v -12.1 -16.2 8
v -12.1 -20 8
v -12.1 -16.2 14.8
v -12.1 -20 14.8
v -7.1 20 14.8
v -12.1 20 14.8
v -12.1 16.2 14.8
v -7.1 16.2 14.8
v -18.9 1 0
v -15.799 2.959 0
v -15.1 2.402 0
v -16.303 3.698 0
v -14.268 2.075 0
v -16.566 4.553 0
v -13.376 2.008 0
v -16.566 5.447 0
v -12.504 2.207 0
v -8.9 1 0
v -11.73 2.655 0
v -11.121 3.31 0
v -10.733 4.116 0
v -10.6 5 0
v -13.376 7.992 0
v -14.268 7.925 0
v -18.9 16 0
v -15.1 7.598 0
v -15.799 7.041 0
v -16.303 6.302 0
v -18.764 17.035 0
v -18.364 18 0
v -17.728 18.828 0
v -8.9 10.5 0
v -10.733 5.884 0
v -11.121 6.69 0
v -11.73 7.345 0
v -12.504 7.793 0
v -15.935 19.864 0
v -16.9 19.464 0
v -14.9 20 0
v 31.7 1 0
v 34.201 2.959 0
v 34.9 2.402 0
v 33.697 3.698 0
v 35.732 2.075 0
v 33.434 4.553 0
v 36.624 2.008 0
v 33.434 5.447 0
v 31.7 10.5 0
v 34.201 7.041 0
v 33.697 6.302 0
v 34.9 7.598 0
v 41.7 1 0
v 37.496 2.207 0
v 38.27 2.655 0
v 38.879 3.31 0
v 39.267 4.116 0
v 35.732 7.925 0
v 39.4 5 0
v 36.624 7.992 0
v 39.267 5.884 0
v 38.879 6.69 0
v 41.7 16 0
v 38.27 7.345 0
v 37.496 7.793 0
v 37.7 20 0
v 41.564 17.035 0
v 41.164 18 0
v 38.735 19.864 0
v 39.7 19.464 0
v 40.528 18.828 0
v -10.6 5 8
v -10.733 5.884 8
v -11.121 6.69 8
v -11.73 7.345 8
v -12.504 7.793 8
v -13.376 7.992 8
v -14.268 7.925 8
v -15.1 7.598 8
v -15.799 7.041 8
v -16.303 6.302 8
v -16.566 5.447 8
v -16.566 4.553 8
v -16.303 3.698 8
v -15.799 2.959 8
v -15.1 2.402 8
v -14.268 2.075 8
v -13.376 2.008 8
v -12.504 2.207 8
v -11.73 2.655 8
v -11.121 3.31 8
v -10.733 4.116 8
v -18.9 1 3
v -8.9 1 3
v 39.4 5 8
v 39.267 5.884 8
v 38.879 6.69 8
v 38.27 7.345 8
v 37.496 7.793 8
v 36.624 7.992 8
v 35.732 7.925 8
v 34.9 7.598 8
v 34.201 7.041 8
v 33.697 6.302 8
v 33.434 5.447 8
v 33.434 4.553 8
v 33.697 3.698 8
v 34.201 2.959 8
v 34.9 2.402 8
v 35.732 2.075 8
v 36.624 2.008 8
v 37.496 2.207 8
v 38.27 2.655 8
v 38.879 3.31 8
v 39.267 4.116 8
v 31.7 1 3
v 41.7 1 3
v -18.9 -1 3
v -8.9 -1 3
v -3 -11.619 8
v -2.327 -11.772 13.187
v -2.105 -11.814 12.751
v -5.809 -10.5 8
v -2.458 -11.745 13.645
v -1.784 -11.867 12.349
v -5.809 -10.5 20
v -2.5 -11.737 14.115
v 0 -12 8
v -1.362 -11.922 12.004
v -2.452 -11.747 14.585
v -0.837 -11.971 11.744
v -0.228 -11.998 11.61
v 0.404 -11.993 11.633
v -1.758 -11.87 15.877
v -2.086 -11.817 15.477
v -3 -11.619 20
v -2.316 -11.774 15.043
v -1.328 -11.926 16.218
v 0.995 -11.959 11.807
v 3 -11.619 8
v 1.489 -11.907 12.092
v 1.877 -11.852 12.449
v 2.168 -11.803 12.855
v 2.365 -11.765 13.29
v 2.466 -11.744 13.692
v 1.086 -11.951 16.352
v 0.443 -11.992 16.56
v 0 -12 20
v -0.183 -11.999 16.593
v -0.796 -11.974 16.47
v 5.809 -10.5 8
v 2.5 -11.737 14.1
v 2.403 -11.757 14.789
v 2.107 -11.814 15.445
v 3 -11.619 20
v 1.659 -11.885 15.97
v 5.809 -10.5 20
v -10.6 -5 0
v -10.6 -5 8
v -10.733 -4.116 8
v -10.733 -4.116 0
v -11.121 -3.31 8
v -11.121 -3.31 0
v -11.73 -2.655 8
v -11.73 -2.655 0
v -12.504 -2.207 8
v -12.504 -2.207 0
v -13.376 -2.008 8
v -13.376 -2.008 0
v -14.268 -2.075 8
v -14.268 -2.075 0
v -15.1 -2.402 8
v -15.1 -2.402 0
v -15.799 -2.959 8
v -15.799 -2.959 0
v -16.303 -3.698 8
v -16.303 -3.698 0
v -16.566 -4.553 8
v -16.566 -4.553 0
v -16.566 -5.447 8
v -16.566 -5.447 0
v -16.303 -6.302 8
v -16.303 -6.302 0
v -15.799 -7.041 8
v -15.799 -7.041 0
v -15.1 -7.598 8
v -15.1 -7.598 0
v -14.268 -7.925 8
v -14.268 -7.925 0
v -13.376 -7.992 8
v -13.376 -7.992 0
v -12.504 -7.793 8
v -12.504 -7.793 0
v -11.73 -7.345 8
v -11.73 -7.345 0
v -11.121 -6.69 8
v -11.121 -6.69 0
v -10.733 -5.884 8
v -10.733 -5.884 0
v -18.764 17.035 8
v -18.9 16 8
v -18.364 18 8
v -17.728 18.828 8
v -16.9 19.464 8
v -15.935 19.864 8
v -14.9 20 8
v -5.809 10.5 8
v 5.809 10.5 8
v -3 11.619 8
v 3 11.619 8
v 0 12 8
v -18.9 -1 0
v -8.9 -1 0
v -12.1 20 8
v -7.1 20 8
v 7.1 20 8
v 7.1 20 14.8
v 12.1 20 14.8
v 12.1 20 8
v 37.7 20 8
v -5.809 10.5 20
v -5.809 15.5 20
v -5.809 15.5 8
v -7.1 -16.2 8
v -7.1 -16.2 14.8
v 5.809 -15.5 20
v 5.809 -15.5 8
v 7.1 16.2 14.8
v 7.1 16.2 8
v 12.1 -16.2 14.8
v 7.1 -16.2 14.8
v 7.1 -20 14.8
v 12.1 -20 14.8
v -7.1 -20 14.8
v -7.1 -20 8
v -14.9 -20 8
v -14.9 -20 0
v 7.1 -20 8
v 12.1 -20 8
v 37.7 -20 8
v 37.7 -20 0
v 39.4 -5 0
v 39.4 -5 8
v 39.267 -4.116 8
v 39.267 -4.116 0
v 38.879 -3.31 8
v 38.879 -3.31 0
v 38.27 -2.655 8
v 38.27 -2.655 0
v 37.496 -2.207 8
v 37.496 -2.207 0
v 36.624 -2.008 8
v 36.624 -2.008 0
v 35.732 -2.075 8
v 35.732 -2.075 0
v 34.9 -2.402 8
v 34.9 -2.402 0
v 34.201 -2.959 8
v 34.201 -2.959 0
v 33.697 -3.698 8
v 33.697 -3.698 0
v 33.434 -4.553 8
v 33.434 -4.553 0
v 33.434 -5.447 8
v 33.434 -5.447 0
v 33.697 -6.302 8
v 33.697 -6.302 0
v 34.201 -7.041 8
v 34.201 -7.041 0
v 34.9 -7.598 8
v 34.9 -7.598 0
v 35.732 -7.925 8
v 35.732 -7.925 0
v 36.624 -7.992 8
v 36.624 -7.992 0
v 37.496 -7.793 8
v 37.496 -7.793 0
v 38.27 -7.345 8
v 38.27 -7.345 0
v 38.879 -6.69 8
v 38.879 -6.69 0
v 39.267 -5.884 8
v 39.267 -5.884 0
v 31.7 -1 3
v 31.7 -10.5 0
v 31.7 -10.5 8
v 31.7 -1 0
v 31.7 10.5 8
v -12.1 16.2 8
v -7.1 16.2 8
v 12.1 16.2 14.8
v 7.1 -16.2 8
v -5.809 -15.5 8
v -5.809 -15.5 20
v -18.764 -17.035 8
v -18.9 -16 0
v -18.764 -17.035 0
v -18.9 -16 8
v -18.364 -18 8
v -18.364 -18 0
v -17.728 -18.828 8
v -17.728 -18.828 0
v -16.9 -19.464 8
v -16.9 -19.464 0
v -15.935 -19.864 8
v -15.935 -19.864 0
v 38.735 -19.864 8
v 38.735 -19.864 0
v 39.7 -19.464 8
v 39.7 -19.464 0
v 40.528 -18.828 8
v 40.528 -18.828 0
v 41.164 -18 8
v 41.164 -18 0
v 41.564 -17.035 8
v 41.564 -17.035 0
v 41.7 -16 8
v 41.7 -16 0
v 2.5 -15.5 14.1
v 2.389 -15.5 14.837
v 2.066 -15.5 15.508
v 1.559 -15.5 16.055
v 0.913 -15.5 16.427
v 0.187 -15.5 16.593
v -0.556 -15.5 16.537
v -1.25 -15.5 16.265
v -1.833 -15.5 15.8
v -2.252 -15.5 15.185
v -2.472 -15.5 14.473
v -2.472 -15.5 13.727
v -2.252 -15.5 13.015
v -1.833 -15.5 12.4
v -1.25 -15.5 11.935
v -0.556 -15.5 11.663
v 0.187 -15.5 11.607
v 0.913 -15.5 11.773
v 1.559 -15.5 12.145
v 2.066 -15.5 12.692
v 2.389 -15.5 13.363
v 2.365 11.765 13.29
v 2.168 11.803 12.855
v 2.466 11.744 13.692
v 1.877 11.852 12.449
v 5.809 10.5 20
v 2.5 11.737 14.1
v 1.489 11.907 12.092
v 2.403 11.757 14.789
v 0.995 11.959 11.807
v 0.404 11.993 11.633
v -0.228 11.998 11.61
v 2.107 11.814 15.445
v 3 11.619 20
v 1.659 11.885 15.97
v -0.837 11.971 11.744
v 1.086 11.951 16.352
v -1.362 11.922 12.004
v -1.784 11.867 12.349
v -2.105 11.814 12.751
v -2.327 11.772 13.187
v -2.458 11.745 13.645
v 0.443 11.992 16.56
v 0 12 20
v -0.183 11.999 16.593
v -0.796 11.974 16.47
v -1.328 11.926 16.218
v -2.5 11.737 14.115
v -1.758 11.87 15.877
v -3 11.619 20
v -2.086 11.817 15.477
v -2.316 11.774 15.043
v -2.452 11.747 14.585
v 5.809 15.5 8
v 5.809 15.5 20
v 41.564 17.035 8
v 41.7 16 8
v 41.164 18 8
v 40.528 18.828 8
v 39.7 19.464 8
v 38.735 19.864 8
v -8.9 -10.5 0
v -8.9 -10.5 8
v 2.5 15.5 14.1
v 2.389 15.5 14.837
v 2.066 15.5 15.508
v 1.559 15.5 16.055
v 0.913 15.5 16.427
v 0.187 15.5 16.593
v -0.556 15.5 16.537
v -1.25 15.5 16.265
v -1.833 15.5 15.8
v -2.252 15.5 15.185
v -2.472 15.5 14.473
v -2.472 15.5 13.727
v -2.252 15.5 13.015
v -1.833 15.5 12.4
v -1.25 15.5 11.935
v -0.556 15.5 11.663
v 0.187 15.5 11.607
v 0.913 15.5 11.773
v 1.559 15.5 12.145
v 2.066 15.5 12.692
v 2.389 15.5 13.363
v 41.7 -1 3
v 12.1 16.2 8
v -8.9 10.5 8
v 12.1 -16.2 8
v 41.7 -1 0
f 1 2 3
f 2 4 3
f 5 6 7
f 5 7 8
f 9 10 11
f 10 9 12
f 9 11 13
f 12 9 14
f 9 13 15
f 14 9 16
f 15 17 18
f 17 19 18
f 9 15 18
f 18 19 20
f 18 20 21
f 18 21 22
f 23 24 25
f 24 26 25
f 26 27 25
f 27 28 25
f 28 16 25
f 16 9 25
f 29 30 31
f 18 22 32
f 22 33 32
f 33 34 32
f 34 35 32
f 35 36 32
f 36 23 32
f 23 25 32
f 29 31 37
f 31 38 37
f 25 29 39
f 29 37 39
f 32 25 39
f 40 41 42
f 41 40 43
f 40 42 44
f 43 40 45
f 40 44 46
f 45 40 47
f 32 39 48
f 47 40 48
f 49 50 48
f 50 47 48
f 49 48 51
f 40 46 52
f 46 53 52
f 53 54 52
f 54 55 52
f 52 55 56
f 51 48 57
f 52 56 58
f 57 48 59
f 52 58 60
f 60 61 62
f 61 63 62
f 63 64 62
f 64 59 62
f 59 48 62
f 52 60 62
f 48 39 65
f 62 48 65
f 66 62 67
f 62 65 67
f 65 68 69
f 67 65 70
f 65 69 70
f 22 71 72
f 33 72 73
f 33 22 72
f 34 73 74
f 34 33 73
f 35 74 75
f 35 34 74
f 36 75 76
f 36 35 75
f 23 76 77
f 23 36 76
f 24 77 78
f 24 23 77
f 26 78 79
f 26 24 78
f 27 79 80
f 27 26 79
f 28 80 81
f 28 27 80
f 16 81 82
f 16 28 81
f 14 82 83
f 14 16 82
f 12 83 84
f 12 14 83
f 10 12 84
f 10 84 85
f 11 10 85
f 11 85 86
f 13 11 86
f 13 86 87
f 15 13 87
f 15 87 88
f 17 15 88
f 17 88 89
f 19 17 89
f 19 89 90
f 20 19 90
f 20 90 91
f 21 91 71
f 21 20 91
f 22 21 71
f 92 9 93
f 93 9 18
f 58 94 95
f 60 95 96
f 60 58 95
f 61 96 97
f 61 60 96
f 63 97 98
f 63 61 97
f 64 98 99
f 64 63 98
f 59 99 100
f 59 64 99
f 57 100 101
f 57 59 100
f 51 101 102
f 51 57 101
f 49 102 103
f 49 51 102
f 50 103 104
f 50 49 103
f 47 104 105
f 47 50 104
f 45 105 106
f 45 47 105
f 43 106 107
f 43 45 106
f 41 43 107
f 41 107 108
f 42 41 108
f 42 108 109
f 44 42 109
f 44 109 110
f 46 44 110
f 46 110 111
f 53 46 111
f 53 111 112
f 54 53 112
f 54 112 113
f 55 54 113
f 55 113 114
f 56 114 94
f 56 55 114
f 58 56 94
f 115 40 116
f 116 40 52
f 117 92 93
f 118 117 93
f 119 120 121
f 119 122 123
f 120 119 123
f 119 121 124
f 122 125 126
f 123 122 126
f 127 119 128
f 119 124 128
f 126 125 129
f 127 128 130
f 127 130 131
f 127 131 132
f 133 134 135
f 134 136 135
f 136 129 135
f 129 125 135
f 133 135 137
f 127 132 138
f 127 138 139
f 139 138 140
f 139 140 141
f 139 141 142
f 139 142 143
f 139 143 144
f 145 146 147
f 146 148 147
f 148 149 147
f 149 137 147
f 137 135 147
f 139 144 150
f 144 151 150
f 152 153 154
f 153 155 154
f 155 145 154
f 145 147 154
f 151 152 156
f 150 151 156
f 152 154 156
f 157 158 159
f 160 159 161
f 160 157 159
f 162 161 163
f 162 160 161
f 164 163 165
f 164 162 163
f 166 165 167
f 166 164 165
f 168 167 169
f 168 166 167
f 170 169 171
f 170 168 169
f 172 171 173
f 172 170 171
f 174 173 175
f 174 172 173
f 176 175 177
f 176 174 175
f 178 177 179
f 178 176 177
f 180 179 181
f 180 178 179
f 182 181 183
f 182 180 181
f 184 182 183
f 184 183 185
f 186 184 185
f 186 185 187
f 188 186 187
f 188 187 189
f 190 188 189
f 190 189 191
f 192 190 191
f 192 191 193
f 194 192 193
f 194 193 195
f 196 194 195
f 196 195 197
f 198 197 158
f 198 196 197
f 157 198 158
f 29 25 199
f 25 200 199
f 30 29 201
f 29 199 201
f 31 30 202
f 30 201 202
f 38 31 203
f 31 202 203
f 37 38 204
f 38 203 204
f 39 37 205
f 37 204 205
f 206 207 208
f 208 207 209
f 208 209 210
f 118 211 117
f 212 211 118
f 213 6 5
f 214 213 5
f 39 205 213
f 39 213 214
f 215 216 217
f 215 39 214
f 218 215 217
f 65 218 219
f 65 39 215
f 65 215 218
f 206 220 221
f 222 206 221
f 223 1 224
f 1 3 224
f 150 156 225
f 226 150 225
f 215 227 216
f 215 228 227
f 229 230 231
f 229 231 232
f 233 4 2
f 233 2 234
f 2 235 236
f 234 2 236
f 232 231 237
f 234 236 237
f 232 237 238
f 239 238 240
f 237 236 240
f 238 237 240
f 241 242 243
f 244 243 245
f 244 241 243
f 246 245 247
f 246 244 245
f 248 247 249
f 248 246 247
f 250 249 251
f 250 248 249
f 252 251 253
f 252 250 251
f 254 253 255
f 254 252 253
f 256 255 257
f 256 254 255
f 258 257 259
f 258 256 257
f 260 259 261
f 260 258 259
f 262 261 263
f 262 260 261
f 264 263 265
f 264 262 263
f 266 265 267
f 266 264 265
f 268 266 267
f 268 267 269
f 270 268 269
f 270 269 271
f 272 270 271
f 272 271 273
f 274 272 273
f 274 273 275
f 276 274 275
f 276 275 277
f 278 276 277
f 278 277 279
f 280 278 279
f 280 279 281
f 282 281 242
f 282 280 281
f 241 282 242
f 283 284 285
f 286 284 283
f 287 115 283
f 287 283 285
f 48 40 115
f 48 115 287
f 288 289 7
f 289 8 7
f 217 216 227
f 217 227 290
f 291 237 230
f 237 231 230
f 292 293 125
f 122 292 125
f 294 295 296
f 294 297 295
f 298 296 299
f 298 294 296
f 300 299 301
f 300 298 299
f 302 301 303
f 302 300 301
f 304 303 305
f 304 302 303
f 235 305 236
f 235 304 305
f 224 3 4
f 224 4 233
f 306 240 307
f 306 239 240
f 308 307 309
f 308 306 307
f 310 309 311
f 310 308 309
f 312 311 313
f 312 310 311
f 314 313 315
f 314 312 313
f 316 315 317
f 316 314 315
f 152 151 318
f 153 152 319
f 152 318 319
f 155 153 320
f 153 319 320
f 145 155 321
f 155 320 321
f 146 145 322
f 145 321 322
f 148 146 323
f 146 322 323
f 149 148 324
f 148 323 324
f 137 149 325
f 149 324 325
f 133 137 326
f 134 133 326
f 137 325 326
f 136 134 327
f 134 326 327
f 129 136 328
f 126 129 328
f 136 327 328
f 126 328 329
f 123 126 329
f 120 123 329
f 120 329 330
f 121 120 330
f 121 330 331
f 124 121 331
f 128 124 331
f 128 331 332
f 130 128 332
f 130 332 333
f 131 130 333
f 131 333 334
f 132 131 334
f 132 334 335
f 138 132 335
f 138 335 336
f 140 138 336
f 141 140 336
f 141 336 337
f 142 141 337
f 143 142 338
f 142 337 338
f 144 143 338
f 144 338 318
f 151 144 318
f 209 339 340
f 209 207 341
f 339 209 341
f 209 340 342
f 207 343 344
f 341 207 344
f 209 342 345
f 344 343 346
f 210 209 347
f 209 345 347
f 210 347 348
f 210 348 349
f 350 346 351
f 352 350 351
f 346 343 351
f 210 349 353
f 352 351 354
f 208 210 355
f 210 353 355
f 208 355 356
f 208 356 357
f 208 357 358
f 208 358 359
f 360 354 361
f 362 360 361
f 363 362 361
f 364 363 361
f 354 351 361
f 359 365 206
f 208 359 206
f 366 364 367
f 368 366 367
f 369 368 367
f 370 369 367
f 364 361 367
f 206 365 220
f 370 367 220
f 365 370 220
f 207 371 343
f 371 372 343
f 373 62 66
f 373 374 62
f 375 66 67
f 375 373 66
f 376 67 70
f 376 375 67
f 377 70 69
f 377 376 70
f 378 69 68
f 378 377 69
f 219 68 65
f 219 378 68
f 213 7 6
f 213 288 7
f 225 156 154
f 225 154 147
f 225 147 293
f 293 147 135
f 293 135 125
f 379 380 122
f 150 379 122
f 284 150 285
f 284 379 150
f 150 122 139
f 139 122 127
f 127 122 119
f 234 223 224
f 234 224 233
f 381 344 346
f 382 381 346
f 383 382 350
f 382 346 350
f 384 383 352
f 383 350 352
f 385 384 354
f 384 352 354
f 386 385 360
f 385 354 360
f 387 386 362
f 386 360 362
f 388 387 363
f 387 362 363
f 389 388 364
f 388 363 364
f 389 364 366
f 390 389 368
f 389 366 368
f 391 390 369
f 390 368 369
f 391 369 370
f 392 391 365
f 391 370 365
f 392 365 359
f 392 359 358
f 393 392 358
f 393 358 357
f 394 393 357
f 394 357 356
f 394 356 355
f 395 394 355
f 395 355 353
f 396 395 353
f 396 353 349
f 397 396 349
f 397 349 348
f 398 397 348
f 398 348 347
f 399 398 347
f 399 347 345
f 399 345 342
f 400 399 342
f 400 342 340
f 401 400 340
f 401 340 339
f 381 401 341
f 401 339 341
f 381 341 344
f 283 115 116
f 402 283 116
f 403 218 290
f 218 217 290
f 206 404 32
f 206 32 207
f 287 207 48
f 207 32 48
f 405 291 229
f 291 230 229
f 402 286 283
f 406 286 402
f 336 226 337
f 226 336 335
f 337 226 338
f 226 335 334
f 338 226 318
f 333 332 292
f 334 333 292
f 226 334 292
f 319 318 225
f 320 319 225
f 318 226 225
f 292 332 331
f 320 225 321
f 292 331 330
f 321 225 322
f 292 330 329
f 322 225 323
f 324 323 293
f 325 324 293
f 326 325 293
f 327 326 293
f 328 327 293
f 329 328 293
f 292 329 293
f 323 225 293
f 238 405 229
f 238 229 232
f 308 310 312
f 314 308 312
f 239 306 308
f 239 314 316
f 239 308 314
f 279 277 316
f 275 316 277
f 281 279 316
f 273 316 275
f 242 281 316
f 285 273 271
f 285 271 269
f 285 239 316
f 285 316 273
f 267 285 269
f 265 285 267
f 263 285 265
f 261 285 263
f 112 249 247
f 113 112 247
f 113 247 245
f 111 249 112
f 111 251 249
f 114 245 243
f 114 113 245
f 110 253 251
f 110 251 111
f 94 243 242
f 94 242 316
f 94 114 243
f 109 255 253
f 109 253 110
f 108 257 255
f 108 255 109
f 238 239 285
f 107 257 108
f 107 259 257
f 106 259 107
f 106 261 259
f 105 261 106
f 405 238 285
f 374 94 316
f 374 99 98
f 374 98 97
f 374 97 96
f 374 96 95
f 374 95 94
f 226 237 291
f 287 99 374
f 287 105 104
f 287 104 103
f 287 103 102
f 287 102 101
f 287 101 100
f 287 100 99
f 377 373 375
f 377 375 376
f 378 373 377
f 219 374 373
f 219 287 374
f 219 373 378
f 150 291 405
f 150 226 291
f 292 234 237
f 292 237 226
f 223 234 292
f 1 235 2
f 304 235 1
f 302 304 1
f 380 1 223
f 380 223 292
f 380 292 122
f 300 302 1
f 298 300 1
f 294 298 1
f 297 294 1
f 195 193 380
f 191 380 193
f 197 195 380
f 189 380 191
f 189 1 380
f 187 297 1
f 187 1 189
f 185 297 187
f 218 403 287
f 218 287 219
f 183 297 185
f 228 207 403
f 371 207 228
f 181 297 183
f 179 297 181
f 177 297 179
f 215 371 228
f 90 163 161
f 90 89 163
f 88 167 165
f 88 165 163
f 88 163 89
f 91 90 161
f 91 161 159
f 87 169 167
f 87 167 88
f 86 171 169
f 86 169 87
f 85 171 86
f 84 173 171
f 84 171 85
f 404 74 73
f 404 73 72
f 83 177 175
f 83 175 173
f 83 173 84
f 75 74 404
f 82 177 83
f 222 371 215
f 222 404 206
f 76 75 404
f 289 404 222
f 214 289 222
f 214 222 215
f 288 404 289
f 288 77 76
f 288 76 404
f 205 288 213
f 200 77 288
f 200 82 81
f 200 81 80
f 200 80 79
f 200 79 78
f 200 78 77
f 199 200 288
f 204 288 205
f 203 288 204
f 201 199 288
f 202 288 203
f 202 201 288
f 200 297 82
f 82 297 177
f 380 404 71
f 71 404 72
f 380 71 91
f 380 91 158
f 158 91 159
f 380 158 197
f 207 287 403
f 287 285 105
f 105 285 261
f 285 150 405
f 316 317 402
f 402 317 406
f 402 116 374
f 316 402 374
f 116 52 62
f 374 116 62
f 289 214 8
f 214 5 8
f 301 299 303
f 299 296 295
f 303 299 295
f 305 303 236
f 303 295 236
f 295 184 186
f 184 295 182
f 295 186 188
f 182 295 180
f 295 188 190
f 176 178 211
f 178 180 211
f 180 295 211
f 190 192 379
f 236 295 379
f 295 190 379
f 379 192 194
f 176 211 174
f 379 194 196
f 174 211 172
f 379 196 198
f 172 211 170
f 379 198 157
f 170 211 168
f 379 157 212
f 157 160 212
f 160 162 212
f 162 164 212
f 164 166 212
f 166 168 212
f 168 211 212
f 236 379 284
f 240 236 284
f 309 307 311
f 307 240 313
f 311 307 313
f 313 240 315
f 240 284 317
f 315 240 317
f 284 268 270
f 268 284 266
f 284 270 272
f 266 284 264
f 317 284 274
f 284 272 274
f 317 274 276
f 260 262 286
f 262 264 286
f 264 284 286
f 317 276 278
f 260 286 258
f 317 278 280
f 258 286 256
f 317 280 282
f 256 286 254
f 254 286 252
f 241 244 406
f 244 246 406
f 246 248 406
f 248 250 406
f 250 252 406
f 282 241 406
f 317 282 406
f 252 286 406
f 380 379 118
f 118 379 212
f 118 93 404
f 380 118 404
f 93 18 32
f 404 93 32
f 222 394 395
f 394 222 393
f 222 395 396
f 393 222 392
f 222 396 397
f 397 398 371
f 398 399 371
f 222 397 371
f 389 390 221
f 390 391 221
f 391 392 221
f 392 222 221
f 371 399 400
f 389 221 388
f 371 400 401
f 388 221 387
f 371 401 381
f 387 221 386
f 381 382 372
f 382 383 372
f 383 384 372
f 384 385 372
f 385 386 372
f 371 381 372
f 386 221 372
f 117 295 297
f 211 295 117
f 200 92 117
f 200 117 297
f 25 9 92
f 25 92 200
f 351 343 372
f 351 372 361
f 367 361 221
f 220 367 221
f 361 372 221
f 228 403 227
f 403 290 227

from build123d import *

# Parameters (mm, degrees)
SKETCH_W        = 60.6
SKETCH_H        = 40
SKETCH_R        = 3
SKETCH_W_2      = 40.6
SKETCH_H_2      = 21
PAD_DEPTH       = 10
SKETCH001_W     = 60.6
SKETCH001_H     = 2
POCKET_DEPTH    = 3
PAD001_DEPTH    = 10
SKETCH003_R     = 2.5
POCKET001_DEPTH = 35.501
SKETCH004_W     = 5
SKETCH004_H     = 3.8
PAD002_DEPTH    = 4.8
PAD002_FACE4_R  = 3
POCKET002_DEPTH = 2
POCKET003_DEPTH = 2
POCKET004_DEPTH = 2
FILLET_R        = 4


with BuildPart() as part:
    # Sketch → Pad (new body)
    with BuildSketch(Plane.XY):
        with Locations((11.4, 0)):
            Rectangle(SKETCH_W, SKETCH_H)
        with Locations((-13.6, 5)):
            Circle(SKETCH_R, mode=Mode.SUBTRACT)
        with Locations((-13.6, -5)):
            Circle(SKETCH_R, mode=Mode.SUBTRACT)
        with Locations((36.4, 5)):
            Circle(SKETCH_R, mode=Mode.SUBTRACT)
        with Locations((36.4, -5)):
            Circle(SKETCH_R, mode=Mode.SUBTRACT)
        with Locations((11.4, 0)):
            Rectangle(SKETCH_W_2, SKETCH_H_2, mode=Mode.SUBTRACT)
    extrude(amount=PAD_DEPTH)

    # Sketch001 (on DatumPlane) → Pocket (cut)
    with BuildSketch(Plane.XY):
        with Locations((11.4, 0)):
            Rectangle(SKETCH001_W, SKETCH001_H)
    extrude(amount=POCKET_DEPTH, mode=Mode.SUBTRACT)

    # Sketch002 (on Face5 of Pocket) → Pad001 (join)
    with BuildSketch(Plane.XY.offset(10)):
        with BuildLine():
            Line((-5.809475, 15.5), (5.809475, 15.5))
            Line((5.809475, 15.5), (5.809475, 10.5))
            ThreePointArc((5.809475, 10.5), (0, 12), (-5.809475, 10.5))
            Line((-5.809475, 10.5), (-5.809475, 15.5))
        make_face()
        with BuildLine():
            Line((5.809475, -10.5), (5.809475, -15.5))
            Line((5.809475, -15.5), (-5.809475, -15.5))
            Line((-5.809475, -15.5), (-5.809475, -10.5))
            ThreePointArc((-5.809475, -10.5), (0, -12), (5.809475, -10.5))
        make_face()
    extrude(amount=PAD001_DEPTH)

    # Sketch003 (on Face23 of Pad001) → Pocket001 (cut, through all)
    with BuildSketch(Plane.XZ.offset(15.5)):
        with Locations((0, 14.1)):
            Circle(SKETCH003_R)
    extrude(amount=-POCKET001_DEPTH, mode=Mode.SUBTRACT)

    # Sketch004 (on Face5 of Pocket001) → Pad002 (join)
    with BuildSketch(Plane.XY.offset(10)):
        with Locations((9.6, 18.1)):
            Rectangle(SKETCH004_W, SKETCH004_H)
        with Locations((-9.6, 18.1)):
            Rectangle(SKETCH004_W, SKETCH004_H)
        with Locations((-9.6, -18.1)):
            Rectangle(SKETCH004_W, SKETCH004_H)
        with Locations((9.6, -18.1)):
            Rectangle(SKETCH004_W, SKETCH004_H)
    extrude(amount=PAD002_DEPTH)

    # Pad002 Face4 → Pocket002 (cut)
    with BuildSketch(Plane(origin=(13.130462, 0, 10), x_dir=(0, 1, 0), z_dir=(0, 0, 1))):
        Polygon((20, 25.230462), (20, 32.030462), (-20, 32.030462), (-20, 25.230462), (-16.2, 25.230462), (-16.2, 20.230462), (-20, 20.230462), (-20, 6.030462), (-16.2, 6.030462), (-16.2, 1.030462), (-20, 1.030462), (-20, -28.569538), (20, -28.569538), (20, 1.030462), (16.2, 1.030462), (16.2, 6.030462), (20, 6.030462), (20, 20.230462), (16.2, 20.230462), (16.2, 25.230462), align=None)
        with Locations((-5, 26.730462)):
            Circle(PAD002_FACE4_R, mode=Mode.SUBTRACT)
        with Locations((-5, -23.269538)):
            Circle(PAD002_FACE4_R, mode=Mode.SUBTRACT)
        with Locations((5, 26.730462)):
            Circle(PAD002_FACE4_R, mode=Mode.SUBTRACT)
        Polygon((-10.5, 22.030462), (10.5, 22.030462), (10.5, 18.939937), (15.5, 18.939937), (15.5, 7.320987), (10.5, 7.320987), (10.5, -18.569538), (-10.5, -18.569538), (-10.5, 7.320987), (-15.5, 7.320987), (-15.5, 18.939937), (-10.5, 18.939937), align=None, mode=Mode.SUBTRACT)
        with Locations((5, -23.269538)):
            Circle(PAD002_FACE4_R, mode=Mode.SUBTRACT)
    extrude(amount=-POCKET002_DEPTH, mode=Mode.SUBTRACT)

    # Pocket002 Face25 → Pocket003 (cut)
    with BuildSketch(Plane(origin=(0, 11.103335, 10), x_dir=(0, 1, 0), z_dir=(0, 0, 1))):
        with BuildLine():
            ThreePointArc((-0.603335, -5.809475), (0.896665, 0), (-0.603335, 5.809475))
            Line((-0.603335, 5.809475), (-0.603335, -5.809475))
        make_face()
    extrude(amount=-POCKET003_DEPTH, mode=Mode.SUBTRACT)

    # Pocket003 Face45 → Pocket004 (cut)
    with BuildSketch(Plane(origin=(0, -11.103335, 10), x_dir=(0, 1, 0), z_dir=(0, 0, 1))):
        with BuildLine():
            Line((0.603335, -5.809475), (0.603335, 5.809475))
            ThreePointArc((0.603335, 5.809475), (-0.896665, 0), (0.603335, -5.809475))
        make_face()
    extrude(amount=-POCKET004_DEPTH, mode=Mode.SUBTRACT)

    # Fillet
    fillet_edges = [part.edges().sort_by_distance(p)[0] for p in [
        (-18.9, -20, 4),
        (-18.9, 20, 4),
        (41.7, -20, 4),
        (41.7, 20, 4),
    ]]
    fillet(fillet_edges, radius=FILLET_R)


solid = part.part
